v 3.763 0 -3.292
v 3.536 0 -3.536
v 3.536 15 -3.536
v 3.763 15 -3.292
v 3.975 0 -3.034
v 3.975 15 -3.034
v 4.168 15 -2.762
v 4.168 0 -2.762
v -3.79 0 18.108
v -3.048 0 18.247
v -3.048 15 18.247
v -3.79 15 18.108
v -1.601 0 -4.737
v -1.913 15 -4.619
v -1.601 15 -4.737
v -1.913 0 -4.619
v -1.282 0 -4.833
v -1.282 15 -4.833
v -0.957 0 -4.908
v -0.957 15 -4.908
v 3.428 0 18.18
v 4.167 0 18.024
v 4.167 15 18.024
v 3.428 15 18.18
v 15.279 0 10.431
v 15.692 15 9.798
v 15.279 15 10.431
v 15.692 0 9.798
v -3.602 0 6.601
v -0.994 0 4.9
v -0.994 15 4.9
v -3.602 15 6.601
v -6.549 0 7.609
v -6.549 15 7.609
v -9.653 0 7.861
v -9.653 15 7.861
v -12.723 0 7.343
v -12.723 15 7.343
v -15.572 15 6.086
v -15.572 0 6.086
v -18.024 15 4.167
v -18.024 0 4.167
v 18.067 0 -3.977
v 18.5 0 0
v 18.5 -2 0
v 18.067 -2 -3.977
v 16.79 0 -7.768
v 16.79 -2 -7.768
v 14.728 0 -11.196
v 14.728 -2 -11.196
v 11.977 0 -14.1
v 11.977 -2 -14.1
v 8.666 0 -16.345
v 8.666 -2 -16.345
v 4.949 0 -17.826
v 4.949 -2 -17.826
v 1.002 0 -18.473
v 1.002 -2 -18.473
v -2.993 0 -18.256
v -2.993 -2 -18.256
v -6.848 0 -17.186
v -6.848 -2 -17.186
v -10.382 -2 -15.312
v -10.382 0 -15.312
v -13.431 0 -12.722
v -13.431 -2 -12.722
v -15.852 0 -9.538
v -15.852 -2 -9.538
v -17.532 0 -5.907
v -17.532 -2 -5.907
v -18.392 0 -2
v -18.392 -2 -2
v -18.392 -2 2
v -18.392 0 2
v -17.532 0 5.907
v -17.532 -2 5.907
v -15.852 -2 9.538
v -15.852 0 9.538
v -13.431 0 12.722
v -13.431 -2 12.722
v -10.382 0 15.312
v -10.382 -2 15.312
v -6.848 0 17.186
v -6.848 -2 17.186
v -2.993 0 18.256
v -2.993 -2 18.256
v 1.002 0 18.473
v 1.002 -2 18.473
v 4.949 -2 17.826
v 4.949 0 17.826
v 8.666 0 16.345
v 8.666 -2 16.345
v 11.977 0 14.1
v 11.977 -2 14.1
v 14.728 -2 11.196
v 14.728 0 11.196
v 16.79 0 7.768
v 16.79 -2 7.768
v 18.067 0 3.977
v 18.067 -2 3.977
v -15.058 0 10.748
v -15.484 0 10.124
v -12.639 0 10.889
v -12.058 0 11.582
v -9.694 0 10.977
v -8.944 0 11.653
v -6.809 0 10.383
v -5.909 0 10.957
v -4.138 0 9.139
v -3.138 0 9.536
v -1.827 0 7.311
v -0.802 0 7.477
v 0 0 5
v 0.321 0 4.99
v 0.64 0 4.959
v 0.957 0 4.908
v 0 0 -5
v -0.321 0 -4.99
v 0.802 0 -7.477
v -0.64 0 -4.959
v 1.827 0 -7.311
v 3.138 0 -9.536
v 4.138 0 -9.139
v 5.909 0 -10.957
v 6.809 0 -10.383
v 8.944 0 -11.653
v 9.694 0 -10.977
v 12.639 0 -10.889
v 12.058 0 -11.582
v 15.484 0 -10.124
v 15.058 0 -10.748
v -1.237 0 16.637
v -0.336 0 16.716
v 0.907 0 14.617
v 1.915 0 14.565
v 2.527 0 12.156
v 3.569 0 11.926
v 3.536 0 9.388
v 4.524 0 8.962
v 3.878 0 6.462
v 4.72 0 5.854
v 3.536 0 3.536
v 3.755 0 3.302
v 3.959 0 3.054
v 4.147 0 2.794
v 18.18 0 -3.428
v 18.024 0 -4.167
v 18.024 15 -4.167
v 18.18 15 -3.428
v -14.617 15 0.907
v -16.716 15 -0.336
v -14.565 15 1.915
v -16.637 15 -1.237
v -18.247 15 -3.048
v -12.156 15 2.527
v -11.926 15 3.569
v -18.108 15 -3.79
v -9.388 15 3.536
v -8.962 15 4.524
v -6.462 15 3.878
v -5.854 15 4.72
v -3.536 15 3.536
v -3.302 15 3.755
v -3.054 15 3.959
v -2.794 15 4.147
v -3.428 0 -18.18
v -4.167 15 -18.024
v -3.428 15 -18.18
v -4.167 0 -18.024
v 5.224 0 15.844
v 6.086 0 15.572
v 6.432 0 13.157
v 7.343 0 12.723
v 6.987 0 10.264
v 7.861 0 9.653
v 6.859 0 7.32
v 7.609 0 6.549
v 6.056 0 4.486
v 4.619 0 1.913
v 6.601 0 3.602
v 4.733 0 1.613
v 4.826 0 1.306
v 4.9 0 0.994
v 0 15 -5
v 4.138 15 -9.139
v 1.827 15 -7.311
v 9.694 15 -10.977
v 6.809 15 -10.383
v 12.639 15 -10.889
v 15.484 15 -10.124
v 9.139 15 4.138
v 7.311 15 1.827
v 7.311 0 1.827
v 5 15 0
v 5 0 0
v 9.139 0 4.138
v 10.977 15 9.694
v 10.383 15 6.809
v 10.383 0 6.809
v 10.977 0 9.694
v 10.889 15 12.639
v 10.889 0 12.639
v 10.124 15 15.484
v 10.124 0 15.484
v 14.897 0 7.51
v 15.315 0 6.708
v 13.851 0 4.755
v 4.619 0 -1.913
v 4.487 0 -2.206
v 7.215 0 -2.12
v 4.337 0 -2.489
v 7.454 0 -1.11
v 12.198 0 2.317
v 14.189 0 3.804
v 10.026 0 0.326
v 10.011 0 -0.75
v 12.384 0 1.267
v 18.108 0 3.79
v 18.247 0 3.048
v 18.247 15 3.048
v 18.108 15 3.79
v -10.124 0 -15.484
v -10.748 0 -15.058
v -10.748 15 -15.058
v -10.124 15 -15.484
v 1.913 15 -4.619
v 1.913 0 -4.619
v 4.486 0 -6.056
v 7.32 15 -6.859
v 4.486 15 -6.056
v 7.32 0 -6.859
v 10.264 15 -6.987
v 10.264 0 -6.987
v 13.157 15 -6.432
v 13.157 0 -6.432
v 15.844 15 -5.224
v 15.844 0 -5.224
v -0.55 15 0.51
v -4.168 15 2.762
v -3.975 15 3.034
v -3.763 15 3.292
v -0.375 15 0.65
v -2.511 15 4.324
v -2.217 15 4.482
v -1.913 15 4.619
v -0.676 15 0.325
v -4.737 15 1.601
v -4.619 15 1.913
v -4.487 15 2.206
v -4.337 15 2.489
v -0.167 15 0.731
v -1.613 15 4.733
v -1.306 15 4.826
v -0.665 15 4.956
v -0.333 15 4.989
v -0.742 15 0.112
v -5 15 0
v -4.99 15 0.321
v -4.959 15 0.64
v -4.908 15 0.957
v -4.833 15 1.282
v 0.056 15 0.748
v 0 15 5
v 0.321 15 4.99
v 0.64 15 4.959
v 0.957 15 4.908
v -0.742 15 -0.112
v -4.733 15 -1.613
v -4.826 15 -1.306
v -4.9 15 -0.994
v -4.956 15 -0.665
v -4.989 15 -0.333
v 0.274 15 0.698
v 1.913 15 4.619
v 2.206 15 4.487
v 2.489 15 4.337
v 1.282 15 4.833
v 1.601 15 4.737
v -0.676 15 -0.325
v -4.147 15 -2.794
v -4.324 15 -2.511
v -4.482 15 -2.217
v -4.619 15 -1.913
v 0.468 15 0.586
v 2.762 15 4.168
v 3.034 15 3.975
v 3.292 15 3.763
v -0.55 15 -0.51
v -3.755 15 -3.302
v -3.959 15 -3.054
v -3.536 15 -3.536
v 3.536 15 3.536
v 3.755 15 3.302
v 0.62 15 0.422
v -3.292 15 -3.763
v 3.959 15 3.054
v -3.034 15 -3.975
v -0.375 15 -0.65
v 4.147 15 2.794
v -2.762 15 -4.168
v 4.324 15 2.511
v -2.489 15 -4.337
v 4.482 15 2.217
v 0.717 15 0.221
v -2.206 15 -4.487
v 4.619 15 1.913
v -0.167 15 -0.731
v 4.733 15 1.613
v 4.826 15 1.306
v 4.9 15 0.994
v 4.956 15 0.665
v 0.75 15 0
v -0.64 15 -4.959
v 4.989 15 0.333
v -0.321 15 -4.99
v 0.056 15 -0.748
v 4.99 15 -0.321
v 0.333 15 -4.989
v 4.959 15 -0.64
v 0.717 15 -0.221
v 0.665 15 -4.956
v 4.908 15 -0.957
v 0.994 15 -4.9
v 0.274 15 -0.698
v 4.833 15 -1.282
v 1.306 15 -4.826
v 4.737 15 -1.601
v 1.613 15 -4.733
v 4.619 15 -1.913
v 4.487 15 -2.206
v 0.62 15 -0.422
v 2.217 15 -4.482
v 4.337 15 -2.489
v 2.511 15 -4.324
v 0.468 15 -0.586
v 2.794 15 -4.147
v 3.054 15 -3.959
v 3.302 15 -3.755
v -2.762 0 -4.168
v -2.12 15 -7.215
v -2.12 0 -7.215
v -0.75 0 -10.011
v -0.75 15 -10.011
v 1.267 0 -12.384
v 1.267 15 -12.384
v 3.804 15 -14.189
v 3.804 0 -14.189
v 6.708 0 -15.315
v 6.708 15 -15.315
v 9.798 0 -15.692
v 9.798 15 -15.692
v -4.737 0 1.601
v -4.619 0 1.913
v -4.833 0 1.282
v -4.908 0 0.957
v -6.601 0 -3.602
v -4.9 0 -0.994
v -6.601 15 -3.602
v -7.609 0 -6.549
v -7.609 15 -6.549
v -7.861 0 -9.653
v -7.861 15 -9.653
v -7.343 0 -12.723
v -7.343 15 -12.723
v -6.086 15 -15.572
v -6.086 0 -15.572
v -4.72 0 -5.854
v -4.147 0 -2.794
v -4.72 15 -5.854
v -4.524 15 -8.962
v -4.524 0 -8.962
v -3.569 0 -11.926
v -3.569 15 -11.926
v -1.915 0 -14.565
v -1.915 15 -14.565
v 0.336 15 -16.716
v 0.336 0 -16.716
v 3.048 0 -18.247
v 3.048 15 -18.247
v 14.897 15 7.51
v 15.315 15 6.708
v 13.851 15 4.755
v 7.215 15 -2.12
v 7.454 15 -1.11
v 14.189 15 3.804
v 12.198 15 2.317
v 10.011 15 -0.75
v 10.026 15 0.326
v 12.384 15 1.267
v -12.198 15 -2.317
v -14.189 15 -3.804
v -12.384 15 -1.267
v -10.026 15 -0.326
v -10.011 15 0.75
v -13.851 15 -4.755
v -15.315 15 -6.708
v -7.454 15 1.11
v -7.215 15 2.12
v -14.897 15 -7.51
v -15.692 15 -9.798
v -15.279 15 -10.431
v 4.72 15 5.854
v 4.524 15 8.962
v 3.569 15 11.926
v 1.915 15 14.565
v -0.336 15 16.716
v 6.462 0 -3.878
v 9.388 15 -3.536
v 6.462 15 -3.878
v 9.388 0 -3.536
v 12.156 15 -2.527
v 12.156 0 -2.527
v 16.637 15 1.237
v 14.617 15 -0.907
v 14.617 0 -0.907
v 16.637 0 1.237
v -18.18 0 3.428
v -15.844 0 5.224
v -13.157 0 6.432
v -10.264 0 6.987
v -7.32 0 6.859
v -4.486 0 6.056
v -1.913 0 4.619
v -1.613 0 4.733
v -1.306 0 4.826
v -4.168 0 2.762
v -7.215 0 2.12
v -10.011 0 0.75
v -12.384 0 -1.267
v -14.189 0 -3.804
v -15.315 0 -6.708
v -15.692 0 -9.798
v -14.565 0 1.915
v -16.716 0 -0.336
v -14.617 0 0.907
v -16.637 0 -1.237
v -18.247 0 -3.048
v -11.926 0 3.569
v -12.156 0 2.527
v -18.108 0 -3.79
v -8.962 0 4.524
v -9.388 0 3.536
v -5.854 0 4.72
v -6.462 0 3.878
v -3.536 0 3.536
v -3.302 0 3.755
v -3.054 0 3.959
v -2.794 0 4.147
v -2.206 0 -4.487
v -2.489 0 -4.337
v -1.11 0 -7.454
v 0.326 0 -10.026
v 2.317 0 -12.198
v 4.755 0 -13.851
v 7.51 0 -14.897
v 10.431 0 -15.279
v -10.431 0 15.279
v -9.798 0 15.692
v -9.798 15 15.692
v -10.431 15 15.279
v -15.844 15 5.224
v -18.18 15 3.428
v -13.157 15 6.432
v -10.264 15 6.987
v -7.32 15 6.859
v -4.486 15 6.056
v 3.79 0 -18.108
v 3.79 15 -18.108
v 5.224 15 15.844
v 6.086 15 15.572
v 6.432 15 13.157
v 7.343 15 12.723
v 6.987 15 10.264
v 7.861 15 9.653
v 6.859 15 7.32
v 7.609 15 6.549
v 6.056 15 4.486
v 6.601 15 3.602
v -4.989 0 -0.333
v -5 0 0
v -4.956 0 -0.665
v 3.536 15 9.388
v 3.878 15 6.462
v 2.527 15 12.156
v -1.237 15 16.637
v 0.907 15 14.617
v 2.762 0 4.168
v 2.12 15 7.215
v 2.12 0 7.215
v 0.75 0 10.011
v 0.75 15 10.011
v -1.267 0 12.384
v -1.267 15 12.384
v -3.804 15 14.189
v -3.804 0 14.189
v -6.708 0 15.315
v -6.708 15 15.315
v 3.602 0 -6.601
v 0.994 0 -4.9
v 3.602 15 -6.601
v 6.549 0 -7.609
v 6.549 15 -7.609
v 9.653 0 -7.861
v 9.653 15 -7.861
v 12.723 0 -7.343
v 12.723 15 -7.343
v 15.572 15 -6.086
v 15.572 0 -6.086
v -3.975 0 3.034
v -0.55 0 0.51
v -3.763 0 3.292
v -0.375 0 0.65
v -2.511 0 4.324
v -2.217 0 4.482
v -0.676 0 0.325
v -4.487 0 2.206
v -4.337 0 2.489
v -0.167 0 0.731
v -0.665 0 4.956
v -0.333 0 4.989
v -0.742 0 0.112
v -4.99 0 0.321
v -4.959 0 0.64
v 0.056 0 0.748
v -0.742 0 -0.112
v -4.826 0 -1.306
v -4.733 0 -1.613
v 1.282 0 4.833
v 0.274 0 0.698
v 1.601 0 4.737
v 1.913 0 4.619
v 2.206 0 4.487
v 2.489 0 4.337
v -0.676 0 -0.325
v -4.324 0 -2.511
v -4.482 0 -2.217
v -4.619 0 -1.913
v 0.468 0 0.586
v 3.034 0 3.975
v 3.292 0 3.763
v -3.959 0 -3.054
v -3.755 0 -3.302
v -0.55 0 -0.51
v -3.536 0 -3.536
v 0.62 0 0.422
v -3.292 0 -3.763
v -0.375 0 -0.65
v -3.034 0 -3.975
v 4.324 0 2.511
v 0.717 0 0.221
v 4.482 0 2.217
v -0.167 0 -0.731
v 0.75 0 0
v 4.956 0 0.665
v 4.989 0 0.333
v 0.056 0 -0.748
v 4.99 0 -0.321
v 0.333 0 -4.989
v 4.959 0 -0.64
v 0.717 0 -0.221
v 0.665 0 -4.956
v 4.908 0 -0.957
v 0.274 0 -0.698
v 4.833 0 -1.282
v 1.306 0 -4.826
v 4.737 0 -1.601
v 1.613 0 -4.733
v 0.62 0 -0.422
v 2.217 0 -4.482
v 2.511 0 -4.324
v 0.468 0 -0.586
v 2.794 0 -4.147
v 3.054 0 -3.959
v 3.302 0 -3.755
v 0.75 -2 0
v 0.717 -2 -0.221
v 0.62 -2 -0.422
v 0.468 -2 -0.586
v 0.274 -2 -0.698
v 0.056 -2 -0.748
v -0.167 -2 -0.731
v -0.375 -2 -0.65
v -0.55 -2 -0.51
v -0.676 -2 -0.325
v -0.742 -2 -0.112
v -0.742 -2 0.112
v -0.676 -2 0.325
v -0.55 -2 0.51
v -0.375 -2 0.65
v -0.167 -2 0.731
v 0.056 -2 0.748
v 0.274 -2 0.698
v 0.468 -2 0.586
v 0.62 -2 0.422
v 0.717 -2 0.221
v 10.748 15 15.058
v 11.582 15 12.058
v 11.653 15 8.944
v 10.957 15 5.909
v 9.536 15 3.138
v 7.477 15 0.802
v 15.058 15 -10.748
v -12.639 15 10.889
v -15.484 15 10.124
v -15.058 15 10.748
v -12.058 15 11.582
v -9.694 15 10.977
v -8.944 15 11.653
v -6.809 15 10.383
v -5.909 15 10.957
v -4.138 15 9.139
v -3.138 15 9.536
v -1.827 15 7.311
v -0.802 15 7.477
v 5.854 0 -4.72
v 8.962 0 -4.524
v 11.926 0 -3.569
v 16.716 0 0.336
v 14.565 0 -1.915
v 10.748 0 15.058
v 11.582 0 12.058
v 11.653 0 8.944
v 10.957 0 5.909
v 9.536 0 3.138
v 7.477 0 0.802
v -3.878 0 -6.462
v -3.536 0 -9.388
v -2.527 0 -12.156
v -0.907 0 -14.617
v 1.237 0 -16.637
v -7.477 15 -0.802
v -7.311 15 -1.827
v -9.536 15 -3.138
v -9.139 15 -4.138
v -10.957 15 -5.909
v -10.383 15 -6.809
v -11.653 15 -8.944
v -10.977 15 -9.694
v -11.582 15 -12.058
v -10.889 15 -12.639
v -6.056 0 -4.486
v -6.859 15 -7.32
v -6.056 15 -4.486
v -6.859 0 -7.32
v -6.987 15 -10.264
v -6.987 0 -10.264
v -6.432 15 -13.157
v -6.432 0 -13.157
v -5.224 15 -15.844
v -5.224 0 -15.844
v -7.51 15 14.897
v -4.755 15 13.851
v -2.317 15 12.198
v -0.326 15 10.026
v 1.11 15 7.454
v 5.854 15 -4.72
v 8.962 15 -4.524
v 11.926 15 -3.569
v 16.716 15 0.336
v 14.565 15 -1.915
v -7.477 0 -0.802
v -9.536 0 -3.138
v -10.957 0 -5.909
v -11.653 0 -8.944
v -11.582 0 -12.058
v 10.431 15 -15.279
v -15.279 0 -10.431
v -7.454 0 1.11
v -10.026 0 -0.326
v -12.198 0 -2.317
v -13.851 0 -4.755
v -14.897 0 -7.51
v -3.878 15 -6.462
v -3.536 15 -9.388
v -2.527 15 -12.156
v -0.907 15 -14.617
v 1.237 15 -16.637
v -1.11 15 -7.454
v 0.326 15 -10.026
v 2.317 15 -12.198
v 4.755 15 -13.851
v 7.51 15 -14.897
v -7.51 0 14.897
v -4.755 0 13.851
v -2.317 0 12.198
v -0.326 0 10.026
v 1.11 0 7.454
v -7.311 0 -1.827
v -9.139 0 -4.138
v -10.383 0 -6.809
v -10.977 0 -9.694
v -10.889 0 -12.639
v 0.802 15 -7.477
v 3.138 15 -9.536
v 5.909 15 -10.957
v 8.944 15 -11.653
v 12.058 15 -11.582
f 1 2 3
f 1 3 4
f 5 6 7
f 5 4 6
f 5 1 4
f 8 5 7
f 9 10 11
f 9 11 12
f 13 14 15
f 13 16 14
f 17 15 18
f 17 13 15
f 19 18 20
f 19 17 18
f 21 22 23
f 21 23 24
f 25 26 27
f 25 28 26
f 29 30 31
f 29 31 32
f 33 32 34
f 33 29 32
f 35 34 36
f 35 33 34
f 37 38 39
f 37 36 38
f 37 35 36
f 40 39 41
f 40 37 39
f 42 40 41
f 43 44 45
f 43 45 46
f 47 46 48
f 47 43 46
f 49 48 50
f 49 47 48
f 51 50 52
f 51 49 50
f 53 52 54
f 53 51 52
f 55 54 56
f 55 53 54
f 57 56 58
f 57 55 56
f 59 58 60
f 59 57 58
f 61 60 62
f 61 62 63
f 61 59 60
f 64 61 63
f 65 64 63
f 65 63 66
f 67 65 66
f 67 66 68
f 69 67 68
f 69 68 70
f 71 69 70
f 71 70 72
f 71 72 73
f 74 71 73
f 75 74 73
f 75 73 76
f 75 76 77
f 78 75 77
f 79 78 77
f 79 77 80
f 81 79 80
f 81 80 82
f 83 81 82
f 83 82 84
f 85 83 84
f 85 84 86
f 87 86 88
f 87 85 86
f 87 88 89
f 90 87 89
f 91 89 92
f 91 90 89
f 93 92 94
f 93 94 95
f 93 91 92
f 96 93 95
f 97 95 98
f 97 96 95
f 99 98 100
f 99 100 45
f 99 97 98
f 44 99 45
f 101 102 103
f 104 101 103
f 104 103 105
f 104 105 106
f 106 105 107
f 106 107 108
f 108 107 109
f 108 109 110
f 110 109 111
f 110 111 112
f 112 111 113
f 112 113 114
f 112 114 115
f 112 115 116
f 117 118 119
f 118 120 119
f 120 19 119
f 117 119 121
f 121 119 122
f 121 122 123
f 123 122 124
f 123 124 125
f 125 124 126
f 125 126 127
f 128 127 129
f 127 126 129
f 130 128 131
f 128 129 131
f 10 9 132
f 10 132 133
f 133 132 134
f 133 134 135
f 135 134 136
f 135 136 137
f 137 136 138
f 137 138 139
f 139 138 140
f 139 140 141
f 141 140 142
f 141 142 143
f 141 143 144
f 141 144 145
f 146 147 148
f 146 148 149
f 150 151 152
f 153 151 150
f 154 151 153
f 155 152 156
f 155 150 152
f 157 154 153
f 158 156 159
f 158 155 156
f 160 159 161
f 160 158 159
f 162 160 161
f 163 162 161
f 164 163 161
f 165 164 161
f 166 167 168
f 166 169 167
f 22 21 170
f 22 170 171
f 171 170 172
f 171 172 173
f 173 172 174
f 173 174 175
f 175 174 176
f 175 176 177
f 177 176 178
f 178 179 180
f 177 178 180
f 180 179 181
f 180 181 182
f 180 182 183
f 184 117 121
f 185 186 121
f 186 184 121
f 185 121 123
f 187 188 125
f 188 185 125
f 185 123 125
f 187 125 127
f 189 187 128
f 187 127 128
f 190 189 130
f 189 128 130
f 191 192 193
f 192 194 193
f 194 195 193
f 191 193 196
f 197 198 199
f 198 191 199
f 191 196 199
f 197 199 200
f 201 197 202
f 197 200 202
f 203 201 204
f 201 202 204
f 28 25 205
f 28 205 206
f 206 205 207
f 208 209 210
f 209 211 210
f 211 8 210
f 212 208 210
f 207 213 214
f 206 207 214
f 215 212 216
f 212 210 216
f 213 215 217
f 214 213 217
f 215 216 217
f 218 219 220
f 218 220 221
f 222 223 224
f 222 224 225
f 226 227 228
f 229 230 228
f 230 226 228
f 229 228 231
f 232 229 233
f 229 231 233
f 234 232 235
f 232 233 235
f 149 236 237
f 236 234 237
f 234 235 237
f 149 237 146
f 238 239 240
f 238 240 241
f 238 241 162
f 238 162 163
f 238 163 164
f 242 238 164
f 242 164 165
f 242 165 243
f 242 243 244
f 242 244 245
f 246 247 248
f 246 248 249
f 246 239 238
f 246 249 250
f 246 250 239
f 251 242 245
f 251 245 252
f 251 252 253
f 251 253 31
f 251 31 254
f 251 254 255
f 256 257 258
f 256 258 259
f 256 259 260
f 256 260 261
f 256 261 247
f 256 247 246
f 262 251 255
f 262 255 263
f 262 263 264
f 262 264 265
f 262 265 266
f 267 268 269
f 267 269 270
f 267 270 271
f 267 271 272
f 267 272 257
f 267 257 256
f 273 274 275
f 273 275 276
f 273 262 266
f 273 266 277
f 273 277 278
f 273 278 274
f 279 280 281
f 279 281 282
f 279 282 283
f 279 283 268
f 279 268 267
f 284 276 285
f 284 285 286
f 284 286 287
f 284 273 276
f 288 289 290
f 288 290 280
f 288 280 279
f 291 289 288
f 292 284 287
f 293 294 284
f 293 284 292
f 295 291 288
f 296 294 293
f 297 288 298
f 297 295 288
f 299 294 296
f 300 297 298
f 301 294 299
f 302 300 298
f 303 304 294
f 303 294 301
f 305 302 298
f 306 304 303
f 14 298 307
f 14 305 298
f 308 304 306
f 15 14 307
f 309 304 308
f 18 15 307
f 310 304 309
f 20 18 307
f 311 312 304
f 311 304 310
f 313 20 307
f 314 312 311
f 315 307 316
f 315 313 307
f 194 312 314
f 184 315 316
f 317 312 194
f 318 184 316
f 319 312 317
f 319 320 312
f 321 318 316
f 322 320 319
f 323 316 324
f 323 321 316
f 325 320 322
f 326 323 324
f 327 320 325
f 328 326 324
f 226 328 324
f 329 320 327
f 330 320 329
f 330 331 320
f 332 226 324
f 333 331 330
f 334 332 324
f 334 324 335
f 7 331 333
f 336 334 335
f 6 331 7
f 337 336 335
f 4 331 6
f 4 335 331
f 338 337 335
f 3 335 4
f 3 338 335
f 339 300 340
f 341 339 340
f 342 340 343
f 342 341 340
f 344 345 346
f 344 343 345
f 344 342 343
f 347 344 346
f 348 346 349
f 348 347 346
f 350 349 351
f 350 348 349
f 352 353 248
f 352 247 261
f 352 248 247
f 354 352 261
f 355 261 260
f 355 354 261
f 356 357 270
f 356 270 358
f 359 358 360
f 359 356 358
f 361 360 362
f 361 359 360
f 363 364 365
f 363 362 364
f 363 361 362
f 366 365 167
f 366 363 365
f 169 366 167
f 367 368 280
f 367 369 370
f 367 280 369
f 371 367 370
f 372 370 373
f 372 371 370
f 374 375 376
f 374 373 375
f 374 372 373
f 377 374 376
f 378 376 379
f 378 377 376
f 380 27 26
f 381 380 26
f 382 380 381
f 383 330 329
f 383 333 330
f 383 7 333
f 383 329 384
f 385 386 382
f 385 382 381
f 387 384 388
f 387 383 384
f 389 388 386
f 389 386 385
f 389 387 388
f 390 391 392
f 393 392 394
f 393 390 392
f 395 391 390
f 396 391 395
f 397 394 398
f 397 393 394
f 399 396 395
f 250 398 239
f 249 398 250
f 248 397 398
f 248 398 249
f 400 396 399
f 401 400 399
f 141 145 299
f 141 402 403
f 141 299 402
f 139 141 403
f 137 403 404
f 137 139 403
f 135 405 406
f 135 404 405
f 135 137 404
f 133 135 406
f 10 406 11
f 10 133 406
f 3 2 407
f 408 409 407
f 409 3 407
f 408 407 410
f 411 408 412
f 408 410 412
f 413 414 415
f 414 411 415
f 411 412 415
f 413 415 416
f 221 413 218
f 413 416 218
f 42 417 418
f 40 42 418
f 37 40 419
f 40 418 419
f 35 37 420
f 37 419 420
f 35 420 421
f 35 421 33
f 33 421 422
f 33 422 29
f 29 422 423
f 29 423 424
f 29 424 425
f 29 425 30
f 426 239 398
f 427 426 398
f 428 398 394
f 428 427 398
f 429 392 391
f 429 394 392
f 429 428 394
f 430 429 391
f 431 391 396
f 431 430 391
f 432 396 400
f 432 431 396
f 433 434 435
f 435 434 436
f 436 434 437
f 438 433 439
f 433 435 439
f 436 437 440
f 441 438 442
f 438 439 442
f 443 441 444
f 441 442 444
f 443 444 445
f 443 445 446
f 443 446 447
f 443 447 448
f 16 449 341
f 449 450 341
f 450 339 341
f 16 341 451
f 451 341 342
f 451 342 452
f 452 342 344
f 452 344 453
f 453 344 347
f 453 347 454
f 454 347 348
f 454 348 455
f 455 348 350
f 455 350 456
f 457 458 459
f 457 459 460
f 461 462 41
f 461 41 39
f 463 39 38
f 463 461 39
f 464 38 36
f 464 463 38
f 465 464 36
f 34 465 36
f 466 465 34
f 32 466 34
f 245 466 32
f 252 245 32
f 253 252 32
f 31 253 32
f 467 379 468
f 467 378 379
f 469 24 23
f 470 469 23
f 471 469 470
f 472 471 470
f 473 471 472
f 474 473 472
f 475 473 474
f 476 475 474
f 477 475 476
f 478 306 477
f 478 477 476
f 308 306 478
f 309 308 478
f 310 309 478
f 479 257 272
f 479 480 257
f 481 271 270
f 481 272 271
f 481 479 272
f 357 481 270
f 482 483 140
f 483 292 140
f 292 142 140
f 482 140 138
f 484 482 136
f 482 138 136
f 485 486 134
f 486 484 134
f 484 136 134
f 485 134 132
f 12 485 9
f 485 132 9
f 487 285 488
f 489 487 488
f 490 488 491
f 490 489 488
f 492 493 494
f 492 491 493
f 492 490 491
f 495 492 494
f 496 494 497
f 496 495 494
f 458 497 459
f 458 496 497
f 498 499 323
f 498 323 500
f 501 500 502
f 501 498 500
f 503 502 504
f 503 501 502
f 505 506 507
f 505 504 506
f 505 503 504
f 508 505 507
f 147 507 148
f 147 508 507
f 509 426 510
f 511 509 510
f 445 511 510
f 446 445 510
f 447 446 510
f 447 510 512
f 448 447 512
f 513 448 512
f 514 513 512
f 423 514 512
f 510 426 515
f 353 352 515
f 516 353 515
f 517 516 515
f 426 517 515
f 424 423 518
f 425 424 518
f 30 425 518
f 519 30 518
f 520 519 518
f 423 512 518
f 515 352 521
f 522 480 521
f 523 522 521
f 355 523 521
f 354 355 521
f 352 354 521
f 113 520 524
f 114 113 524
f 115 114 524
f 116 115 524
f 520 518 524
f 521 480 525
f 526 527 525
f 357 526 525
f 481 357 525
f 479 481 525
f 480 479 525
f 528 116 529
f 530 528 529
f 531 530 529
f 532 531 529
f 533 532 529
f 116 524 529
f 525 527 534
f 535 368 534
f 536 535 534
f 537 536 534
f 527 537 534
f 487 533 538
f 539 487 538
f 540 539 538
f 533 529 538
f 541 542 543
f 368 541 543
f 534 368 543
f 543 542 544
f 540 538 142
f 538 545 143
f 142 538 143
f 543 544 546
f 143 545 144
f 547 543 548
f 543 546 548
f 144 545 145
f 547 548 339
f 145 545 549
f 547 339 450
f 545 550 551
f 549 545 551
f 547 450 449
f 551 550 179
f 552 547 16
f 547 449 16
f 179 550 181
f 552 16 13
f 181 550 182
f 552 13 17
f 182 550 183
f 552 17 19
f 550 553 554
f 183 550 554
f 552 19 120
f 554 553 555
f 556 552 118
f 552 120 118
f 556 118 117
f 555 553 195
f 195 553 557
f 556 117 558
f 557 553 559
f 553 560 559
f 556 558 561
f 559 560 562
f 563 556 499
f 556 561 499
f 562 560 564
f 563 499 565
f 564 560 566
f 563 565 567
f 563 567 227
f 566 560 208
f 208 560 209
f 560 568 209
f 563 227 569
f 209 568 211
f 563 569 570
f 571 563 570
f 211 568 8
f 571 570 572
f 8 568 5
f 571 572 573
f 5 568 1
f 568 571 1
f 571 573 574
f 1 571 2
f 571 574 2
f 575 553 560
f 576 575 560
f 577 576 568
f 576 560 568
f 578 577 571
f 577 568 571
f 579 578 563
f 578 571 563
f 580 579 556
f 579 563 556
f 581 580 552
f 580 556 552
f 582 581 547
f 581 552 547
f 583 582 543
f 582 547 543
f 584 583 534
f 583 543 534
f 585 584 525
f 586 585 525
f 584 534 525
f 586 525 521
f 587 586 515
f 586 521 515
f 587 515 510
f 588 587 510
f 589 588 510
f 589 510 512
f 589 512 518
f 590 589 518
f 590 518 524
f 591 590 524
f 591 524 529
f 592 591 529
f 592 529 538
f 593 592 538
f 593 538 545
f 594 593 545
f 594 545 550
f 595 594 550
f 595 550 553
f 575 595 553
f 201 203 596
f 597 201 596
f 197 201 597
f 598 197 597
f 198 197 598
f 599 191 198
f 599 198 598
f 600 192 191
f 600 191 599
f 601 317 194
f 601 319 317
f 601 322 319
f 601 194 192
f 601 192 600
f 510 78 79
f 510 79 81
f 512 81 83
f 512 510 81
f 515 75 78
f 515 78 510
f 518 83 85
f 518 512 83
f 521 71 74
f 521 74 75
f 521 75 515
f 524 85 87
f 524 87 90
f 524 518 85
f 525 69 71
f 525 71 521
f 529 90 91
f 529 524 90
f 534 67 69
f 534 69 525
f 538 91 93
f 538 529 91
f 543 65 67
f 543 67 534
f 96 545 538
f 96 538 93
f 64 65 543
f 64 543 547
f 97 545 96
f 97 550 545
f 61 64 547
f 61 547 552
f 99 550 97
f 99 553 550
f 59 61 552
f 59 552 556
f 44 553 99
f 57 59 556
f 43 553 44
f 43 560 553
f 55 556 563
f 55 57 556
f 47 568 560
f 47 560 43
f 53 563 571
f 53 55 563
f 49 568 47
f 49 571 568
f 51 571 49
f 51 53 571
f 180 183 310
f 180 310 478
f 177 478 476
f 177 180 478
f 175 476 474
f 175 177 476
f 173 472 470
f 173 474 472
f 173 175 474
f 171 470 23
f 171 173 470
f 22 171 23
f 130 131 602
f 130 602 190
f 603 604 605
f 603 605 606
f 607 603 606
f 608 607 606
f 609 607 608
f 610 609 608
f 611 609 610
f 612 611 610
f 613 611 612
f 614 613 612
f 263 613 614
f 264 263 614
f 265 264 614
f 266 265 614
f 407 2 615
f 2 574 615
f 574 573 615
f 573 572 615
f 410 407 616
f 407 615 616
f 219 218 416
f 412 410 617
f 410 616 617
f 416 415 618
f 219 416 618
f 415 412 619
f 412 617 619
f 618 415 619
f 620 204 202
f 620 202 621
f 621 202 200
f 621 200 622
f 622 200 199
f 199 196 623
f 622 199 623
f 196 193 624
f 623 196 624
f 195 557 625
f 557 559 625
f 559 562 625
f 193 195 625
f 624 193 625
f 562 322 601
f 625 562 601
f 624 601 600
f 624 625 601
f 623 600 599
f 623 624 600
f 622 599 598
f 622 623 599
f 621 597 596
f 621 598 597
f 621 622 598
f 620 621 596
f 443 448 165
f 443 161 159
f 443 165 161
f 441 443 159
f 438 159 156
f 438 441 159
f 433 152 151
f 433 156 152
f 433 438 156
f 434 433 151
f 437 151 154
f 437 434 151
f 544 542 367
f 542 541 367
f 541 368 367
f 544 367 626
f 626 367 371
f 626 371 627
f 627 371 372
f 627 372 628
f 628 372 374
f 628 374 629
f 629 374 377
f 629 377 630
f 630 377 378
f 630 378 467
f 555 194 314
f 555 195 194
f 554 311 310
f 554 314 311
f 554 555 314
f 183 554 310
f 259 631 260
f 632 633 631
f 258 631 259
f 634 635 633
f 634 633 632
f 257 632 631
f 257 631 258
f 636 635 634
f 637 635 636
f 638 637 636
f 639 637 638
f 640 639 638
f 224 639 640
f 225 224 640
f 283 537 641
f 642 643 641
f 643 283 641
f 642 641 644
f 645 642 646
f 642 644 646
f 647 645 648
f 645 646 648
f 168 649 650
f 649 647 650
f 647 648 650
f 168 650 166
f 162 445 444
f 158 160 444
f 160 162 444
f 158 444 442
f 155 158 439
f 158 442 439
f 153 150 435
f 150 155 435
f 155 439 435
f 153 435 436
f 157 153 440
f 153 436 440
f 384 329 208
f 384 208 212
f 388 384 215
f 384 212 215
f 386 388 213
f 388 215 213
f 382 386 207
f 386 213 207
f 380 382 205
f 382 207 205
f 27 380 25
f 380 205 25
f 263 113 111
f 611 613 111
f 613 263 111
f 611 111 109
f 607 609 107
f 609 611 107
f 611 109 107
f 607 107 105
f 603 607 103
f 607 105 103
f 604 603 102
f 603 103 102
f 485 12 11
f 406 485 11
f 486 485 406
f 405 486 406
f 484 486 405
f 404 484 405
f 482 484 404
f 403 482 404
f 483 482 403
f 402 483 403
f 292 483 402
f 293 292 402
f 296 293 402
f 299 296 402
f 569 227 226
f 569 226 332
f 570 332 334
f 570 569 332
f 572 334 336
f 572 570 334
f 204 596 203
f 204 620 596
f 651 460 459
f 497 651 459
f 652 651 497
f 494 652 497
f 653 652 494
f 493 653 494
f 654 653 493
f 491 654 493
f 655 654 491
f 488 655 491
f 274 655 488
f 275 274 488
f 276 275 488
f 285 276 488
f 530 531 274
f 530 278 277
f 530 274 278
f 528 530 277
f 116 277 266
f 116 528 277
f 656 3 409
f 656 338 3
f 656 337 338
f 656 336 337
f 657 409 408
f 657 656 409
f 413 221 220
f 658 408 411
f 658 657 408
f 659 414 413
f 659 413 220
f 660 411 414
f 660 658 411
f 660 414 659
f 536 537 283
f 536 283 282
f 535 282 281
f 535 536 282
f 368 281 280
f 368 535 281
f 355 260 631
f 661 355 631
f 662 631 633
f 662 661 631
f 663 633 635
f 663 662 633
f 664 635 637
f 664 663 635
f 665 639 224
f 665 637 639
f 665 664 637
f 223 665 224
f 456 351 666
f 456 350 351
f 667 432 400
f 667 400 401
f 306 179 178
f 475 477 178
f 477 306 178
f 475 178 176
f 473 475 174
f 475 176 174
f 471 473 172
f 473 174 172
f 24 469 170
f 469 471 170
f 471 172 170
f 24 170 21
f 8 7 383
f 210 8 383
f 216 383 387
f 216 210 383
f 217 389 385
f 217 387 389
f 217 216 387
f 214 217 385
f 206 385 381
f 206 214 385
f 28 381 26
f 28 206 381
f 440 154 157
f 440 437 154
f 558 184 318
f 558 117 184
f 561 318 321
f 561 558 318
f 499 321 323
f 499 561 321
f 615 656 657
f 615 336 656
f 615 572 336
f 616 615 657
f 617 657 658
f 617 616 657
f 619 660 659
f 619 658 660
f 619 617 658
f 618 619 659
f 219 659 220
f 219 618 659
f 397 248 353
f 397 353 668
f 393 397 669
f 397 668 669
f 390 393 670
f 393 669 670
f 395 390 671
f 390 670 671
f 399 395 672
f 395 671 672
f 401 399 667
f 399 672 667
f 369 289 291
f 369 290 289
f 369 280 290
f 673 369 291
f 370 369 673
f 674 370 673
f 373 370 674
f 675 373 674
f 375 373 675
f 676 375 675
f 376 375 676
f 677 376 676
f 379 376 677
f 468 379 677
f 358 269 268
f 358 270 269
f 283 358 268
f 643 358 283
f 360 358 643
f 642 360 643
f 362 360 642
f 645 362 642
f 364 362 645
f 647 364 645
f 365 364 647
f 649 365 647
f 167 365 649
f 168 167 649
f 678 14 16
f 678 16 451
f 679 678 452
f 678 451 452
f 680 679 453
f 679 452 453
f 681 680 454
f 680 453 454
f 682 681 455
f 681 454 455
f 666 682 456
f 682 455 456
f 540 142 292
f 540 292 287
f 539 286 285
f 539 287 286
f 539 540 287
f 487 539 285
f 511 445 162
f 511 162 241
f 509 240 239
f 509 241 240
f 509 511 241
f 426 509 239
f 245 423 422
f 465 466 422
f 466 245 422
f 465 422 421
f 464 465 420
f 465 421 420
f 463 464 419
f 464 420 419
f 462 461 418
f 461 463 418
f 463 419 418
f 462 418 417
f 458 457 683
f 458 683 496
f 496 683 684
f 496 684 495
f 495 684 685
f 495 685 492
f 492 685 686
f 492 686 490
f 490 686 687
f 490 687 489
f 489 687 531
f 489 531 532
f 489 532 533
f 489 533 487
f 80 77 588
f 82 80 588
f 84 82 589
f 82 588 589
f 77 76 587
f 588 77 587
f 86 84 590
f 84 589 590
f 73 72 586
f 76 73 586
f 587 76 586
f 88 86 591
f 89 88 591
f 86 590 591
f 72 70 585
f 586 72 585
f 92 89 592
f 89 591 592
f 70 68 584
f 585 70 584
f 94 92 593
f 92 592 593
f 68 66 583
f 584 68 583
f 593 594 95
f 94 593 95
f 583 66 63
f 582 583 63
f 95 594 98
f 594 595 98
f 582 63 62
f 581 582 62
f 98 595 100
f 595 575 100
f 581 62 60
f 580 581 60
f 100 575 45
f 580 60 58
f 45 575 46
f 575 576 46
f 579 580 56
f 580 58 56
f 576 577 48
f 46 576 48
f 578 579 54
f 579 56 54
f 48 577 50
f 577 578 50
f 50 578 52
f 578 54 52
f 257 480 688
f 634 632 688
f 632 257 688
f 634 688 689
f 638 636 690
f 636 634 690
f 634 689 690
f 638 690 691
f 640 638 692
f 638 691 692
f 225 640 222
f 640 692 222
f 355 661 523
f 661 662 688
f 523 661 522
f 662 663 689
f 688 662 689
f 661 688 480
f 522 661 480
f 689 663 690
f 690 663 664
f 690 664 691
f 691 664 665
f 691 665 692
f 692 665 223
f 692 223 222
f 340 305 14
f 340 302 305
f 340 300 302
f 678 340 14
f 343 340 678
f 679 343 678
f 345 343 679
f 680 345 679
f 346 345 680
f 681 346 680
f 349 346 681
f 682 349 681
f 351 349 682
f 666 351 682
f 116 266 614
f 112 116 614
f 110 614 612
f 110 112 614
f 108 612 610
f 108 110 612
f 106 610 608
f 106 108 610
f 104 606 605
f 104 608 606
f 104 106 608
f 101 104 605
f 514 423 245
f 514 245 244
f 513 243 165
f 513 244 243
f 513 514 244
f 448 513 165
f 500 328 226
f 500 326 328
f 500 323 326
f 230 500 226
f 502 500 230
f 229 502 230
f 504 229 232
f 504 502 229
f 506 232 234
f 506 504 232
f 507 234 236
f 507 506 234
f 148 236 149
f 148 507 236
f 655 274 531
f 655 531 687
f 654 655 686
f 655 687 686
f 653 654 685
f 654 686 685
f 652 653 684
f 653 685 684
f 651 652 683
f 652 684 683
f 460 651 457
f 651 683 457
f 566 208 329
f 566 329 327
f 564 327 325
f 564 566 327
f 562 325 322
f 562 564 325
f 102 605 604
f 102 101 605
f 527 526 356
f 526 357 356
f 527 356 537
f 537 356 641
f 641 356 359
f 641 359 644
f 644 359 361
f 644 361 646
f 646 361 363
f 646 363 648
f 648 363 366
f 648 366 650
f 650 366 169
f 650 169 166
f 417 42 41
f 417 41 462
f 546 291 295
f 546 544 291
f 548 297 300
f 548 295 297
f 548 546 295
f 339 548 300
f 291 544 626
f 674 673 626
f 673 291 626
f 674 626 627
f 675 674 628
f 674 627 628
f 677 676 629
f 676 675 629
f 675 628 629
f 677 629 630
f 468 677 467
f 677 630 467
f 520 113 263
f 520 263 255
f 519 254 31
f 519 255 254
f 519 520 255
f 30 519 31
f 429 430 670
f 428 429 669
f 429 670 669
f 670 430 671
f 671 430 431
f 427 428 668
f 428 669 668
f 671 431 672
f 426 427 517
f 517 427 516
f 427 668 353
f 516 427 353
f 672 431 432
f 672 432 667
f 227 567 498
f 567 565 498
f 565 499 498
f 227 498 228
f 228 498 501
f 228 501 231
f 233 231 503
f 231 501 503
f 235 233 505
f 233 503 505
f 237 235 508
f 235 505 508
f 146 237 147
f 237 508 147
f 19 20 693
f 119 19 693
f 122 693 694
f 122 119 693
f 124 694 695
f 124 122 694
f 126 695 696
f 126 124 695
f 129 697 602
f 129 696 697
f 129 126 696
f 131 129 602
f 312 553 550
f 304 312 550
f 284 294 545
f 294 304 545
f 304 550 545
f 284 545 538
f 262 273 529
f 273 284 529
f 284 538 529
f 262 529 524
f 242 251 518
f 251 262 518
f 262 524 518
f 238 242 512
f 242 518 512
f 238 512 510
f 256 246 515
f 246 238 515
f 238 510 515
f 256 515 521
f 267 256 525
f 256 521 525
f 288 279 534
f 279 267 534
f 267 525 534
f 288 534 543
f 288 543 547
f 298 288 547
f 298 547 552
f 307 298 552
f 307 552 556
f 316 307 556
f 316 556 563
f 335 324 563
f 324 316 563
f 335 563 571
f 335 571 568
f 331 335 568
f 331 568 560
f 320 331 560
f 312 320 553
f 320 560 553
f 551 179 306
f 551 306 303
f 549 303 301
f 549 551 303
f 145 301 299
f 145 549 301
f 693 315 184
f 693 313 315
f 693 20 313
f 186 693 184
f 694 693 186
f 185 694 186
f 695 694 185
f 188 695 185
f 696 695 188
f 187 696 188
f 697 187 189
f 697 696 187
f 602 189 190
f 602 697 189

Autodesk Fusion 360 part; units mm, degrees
sketch "Sketch1" plane through (0, 0, 0) normal (0, 1, 0) x (1, 0, 0)
  circle A0 centre (0, 0) radius 5
  circle A1 centre (0, 0) radius 18.5
  circle A2 centre (0, 0) radius 0.75
  line L0 (-21, 0) -> (20.3872, 0) construction
  line L1 (0, 20) -> (0, -20) construction
  arc A3 (10.124, -15.484) -> (5, 0) centre (-1.6517, -10.791) ccw
  arc A4 (15.2788, -10.4311) -> (4.6194, 1.9134) centre (2.6036, -10.6017) ccw
  arc A5 (18.1076, -3.7901) -> (3.5355, 3.5355) centre (6.4625, -8.7984) ccw
  arc A6 (18.1796, 3.4279) -> (1.9134, 4.6194) centre (9.3375, -5.6555) ccw
  arc A7 (15.484, 10.124) -> (0, 5) centre (10.791, -1.6517) ccw
  arc A8 (10.4311, 15.2788) -> (-1.9134, 4.6194) centre (10.6017, 2.6036) ccw
  arc A9 (3.7901, 18.1076) -> (-3.5355, 3.5355) centre (8.7984, 6.4625) ccw
  arc A10 (-3.4279, 18.1796) -> (-4.6194, 1.9134) centre (5.6555, 9.3375) ccw
  arc A11 (-10.124, 15.484) -> (-5, 0) centre (1.6517, 10.791) ccw
  arc A12 (-15.2788, 10.4311) -> (-4.6194, -1.9134) centre (-2.6036, 10.6017) ccw
  arc A13 (-18.1076, 3.7901) -> (-3.5355, -3.5355) centre (-6.4625, 8.7984) ccw
  arc A14 (-18.1796, -3.4279) -> (-1.9134, -4.6194) centre (-9.3375, 5.6555) ccw
  arc A15 (-15.484, -10.124) -> (0, -5) centre (-10.791, 1.6517) ccw
  arc A16 (-10.4311, -15.2788) -> (1.9134, -4.6194) centre (-10.6017, -2.6036) ccw
  arc A17 (-3.7901, -18.1076) -> (3.5355, -3.5355) centre (-8.7984, -6.4625) ccw
  arc A18 (3.4279, -18.1796) -> (4.6194, -1.9134) centre (-5.6555, -9.3375) ccw
  arc A19 (10.7478, -15.0577) -> (4.9076, 0.9567) centre (-0.8522, -10.2159) ccw
  line L2 (10.7478, -15.0577) -> (10.124, -15.484)
  arc A20 (15.692, -9.7985) -> (4.168, 2.7619) centre (3.1221, -9.7644) ccw
  line L3 (15.692, -9.7985) -> (15.2788, -10.4311)
  arc A21 (18.2472, -3.0476) -> (2.7938, 4.1467) centre (6.6211, -7.8264) ccw
  line L4 (18.2472, -3.0476) -> (18.1076, -3.7901)
  arc A22 (18.0245, 4.1673) -> (0.9942, 4.9002) centre (9.1122, -4.6968) ccw
  line L5 (18.0245, 4.1673) -> (18.1796, 3.4279)
  arc A23 (15.0577, 10.7478) -> (-0.9567, 4.9076) centre (10.2159, -0.8522) ccw
  line L6 (15.0577, 10.7478) -> (15.484, 10.124)
  arc A24 (9.7985, 15.692) -> (-2.7619, 4.168) centre (9.7644, 3.1221) ccw
  line L7 (9.7985, 15.692) -> (10.4311, 15.2788)
  arc A25 (3.0476, 18.2472) -> (-4.1467, 2.7938) centre (7.8264, 6.6211) ccw
  line L8 (3.0476, 18.2472) -> (3.7901, 18.1076)
  arc A26 (-4.1673, 18.0245) -> (-4.9002, 0.9942) centre (4.6968, 9.1122) ccw
  line L9 (-4.1673, 18.0245) -> (-3.4279, 18.1796)
  arc A27 (-10.7478, 15.0577) -> (-4.9076, -0.9567) centre (0.8522, 10.2159) ccw
  line L10 (-10.7478, 15.0577) -> (-10.124, 15.484)
  arc A28 (-15.692, 9.7985) -> (-4.168, -2.7619) centre (-3.1221, 9.7644) ccw
  line L11 (-15.692, 9.7985) -> (-15.2788, 10.4311)
  arc A29 (-18.2472, 3.0476) -> (-2.7938, -4.1467) centre (-6.6211, 7.8264) ccw
  line L12 (-18.2472, 3.0476) -> (-18.1076, 3.7901)
  arc A30 (-18.0245, -4.1673) -> (-0.9942, -4.9002) centre (-9.1122, 4.6968) ccw
  line L13 (-18.0245, -4.1673) -> (-18.1796, -3.4279)
  arc A31 (-15.0577, -10.7478) -> (0.9567, -4.9076) centre (-10.2159, 0.8522) ccw
  line L14 (-15.0577, -10.7478) -> (-15.484, -10.124)
  arc A32 (-9.7985, -15.692) -> (2.7619, -4.168) centre (-9.7644, -3.1221) ccw
  line L15 (-9.7985, -15.692) -> (-10.4311, -15.2788)
  arc A33 (-3.0476, -18.2472) -> (4.1467, -2.7938) centre (-7.8264, -6.6211) ccw
  line L16 (-3.0476, -18.2472) -> (-3.7901, -18.1076)
  arc A34 (4.1673, -18.0245) -> (4.9002, -0.9942) centre (-4.6968, -9.1122) ccw
  line L17 (4.1673, -18.0245) -> (3.4279, -18.1796)
  dimension "d1" = 10
  dimension "d2" = 37
  dimension "d3" = 1.5
  dimension "d5" = 360
  dimension "d7" = 360
extrude "Extrude2" add sketch "Sketch1" against normal blind 2 contours A0 | A0 A1 A3 A34 | A0 A3 A19 L2 | A0 A1 A4 A19 | A0 A18 A34 L17 | A1 L2 | A0 A4 A20 L3 | A0 A1 A18 A33 | A1 L17 | A0 A1 A5 A20 | A1 L3 | A0 A17 A33 L16 | A0 A5 A21 L4 | A0 A1 A17 A32 | A1 L16 | A0 A1 A6 A21 | A1 L4 | A0 A16 A32 L15 | A0 A6 A22 L5 | A0 A1 A16 A31 | A1 L15 | A0 A1 A7 A22 | A1 L5 | A0 A15 A31 L14 | A0 A7 A23 L6 | A0 A1 A15 A30 | A1 L14 | A0 A1 A8 A23 | A1 L6 | A0 A14 A30 L13 | A0 A8 A24 L7 | A0 A1 A14 A29 | A1 L13 | A0 A1 A9 A24 | A1 L7 | A0 A13 A29 L12 | A0 A9 A25 L8 | A0 A1 A13 A28 | A1 L12 | A0 A1 A10 A25 | A1 L8 | A0 A12 A28 L11 | A0 A10 A26 L9 | A0 A1 A12 A27 | A1 L11 | A0 A1 A11 A26 | A1 L9 | A0 A11 A27 L10 | A1 L10 | A2 makes body 1
extrude "Extrude1" add sketch "Sketch1" along normal blind 15 separate body contours A0 | A0 A3 A19 L2 | A0 A18 A34 L17 | A0 A4 A20 L3 | A0 A17 A33 L16 | A0 A5 A21 L4 | A0 A16 A32 L15 | A0 A6 A22 L5 | A0 A15 A31 L14 | A0 A7 A23 L6 | A0 A14 A30 L13 | A0 A8 A24 L7 | A0 A13 A29 L12 | A0 A9 A25 L8 | A0 A12 A28 L11 | A0 A10 A26 L9 | A0 A11 A27 L10 makes body 2
extrude "Extrude3" cut sketch "Sketch1" against normal blind 2 contours A2 bodies 1
